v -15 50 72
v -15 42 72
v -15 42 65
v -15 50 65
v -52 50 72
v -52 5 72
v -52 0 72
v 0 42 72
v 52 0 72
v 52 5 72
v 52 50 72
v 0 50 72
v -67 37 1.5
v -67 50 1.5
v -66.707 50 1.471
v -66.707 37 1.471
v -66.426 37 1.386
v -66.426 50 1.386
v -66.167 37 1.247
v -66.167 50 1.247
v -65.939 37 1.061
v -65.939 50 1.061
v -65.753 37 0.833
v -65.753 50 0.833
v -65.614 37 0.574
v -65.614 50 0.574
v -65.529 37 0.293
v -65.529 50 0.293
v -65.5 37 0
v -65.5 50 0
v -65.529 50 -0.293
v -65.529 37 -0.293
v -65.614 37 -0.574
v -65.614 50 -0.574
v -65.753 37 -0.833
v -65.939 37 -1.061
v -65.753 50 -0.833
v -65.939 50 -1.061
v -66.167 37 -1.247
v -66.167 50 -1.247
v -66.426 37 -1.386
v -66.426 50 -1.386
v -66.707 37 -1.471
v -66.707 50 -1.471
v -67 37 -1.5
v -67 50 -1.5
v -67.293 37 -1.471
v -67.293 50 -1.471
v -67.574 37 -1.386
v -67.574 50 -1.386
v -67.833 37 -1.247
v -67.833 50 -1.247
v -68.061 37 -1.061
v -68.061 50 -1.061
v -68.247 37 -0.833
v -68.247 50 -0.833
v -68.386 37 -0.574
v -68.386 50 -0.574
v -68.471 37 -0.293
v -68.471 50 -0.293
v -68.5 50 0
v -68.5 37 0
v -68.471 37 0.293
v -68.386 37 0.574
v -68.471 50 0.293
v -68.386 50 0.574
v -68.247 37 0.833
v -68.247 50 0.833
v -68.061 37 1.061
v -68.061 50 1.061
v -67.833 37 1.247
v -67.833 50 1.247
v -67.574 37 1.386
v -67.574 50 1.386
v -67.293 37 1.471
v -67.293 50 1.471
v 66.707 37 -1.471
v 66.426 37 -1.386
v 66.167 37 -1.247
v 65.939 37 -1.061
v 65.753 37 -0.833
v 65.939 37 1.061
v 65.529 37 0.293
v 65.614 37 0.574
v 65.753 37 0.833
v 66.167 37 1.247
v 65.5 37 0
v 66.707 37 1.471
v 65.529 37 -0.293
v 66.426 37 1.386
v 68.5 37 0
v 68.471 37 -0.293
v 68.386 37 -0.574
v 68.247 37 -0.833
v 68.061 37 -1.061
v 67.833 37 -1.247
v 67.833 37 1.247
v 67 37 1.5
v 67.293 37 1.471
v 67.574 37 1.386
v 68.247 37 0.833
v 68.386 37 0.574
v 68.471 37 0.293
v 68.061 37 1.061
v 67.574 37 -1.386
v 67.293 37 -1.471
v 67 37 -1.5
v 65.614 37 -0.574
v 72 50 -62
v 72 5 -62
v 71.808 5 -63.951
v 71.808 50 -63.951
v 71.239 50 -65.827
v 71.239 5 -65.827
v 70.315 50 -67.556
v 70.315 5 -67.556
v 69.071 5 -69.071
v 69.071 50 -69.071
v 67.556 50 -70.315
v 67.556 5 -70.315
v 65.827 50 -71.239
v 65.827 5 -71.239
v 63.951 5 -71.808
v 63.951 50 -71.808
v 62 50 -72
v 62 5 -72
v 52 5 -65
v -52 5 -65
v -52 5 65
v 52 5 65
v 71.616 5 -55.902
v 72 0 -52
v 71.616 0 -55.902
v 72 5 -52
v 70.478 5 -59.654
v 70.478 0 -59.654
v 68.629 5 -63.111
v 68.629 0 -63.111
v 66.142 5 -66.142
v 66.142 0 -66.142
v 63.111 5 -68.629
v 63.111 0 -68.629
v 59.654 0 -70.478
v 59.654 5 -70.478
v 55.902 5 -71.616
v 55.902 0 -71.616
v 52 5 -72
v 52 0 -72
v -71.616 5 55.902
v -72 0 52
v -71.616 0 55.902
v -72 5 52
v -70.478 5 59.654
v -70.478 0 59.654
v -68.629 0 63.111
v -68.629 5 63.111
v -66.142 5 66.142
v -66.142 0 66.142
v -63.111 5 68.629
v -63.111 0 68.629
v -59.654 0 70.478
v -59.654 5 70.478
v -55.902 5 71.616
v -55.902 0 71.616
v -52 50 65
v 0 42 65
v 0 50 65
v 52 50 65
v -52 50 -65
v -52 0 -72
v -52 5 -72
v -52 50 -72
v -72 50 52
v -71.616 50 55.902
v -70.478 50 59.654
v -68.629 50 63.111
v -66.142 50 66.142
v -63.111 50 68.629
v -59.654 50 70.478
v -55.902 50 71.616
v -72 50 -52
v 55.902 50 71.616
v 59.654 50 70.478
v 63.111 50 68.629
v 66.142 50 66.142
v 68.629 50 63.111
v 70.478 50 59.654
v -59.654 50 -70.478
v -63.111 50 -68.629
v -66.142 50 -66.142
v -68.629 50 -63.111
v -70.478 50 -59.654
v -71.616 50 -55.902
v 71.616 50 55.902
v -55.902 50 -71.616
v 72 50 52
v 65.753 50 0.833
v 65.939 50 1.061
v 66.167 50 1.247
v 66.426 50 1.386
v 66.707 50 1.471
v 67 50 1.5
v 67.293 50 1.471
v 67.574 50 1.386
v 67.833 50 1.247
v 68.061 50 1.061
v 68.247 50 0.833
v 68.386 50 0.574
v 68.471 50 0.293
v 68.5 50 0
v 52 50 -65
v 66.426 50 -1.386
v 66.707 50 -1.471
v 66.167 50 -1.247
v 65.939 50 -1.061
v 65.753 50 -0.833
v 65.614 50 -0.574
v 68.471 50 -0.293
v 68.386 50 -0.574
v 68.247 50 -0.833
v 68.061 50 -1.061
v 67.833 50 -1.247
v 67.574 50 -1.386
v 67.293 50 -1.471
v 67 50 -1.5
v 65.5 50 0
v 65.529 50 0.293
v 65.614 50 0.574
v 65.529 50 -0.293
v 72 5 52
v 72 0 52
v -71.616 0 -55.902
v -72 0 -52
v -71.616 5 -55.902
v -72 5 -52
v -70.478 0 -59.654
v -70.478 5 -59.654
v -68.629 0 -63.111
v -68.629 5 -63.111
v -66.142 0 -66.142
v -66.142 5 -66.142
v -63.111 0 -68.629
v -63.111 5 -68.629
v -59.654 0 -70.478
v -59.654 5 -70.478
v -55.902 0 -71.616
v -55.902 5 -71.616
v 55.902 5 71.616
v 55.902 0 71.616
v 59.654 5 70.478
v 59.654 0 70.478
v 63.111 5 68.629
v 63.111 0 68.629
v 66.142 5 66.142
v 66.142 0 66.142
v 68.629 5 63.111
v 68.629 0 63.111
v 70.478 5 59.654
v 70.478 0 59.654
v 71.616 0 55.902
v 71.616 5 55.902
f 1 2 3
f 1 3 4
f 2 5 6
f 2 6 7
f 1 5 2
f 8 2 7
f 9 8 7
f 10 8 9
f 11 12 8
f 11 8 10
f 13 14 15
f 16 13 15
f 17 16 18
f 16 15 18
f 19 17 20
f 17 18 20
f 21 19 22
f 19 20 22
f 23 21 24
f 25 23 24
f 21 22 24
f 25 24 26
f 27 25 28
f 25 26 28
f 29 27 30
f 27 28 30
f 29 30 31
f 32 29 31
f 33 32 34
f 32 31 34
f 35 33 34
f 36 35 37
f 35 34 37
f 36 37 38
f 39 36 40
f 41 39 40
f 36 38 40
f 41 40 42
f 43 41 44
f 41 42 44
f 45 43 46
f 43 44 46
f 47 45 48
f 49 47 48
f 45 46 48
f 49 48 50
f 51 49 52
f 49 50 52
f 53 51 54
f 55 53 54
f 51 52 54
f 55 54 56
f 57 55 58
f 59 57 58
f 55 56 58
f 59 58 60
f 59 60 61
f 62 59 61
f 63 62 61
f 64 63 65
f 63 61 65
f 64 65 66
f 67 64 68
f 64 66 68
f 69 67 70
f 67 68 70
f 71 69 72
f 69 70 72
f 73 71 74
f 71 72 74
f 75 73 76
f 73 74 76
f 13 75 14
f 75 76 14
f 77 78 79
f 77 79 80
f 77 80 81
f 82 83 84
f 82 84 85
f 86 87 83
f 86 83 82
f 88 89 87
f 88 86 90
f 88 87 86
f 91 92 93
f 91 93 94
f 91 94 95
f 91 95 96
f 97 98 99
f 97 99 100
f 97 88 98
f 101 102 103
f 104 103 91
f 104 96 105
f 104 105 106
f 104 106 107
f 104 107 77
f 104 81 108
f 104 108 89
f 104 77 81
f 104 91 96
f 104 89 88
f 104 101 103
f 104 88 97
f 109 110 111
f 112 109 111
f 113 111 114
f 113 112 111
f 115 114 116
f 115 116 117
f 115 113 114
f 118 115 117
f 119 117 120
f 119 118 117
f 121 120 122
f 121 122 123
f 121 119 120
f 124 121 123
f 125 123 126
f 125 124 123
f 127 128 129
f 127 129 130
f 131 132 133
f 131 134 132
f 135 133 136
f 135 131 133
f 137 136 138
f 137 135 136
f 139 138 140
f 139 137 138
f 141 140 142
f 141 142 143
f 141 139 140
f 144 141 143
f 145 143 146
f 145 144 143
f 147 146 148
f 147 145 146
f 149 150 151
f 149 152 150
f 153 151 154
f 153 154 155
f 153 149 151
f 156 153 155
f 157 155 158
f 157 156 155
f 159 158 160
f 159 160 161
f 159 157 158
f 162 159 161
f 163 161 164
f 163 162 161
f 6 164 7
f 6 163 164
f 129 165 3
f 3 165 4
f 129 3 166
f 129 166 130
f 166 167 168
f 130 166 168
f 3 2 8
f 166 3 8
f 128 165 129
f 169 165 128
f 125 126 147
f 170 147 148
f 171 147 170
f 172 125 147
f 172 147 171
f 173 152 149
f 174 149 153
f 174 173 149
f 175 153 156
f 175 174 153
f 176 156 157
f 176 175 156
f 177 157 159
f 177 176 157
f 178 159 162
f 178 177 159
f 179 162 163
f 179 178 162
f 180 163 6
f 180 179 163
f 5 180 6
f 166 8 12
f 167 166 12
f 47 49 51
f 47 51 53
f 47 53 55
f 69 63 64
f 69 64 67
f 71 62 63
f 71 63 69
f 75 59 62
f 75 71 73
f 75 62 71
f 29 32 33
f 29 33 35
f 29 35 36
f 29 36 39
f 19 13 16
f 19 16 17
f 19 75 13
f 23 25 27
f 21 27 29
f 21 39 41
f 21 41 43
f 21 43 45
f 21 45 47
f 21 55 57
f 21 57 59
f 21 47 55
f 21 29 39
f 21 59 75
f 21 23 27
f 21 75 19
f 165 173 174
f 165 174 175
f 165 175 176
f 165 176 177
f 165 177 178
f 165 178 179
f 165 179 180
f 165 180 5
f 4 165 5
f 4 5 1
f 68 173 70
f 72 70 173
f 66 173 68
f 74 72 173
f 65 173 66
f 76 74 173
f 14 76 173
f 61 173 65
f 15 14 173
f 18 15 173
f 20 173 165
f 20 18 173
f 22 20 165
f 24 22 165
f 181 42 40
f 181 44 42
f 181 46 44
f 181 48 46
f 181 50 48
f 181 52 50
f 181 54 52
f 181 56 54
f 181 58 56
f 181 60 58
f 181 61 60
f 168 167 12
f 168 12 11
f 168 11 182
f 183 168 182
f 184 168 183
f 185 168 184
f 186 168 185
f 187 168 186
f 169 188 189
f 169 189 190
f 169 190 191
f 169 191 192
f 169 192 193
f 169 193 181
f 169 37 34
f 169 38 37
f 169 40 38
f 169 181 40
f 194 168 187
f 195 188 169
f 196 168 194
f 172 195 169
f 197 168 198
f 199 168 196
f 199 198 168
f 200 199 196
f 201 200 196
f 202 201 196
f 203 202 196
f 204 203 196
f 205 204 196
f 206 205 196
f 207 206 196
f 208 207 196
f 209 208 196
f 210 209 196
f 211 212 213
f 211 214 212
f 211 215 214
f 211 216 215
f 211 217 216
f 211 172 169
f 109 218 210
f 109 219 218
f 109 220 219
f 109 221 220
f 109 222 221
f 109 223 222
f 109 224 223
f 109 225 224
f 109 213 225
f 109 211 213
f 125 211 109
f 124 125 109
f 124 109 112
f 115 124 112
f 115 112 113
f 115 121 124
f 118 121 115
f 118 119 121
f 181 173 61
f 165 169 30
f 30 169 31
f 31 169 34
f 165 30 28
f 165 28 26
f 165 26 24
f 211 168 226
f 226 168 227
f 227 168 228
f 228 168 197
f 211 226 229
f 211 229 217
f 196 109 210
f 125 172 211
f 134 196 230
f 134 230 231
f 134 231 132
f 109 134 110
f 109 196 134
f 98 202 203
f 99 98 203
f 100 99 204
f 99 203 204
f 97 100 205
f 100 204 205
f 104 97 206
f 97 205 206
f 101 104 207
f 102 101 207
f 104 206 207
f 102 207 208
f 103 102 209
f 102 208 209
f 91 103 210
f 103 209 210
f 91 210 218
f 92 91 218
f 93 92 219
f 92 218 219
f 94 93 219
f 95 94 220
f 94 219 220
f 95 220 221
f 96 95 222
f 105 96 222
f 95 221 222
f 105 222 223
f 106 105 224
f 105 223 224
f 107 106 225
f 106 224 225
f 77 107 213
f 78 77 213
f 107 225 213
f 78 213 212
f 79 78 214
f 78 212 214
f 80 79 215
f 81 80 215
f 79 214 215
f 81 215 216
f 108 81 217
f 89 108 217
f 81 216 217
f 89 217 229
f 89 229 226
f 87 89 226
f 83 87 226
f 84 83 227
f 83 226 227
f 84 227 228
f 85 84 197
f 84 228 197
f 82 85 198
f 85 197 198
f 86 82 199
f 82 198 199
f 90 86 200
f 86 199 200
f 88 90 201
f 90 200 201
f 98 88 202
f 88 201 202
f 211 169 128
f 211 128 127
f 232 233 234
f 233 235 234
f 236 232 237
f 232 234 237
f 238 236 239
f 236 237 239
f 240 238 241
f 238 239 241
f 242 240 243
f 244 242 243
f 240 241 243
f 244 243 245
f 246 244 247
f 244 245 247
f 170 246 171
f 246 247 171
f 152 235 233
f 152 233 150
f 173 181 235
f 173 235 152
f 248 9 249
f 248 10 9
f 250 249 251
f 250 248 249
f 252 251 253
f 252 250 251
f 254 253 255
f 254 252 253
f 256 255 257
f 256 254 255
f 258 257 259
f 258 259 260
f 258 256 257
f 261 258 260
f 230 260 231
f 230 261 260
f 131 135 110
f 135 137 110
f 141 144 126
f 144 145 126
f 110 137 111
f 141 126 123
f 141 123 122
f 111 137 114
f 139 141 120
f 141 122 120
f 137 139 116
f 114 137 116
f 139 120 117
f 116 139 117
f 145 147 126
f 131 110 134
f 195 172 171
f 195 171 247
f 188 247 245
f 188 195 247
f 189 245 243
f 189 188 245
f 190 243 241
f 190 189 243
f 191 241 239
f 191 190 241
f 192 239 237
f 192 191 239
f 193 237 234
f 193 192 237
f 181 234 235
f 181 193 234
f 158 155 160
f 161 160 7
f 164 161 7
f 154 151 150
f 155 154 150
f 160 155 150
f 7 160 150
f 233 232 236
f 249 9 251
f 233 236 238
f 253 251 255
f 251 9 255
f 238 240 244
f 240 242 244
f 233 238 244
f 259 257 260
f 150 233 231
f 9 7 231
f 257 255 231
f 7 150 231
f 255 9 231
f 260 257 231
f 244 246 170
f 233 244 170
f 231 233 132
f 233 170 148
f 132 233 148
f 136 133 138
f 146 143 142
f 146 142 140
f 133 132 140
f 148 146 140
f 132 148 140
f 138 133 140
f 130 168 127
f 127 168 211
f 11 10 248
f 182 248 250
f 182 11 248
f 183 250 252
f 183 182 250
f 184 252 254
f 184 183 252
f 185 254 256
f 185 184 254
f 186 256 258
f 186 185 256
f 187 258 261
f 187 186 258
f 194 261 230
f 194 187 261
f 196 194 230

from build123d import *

# Parameters (mm, degrees)
SKETCH1_W           = 144
SKETCH1_H           = 144
BOSS_EXTRUDE1_DEPTH = 5
FILLET1_R           = 20
BOSS_EXTRUDE2_START = 45
SKETCH2_W           = 104
SKETCH2_H           = 130
BOSS_EXTRUDE2_DEPTH = 45
SKETCH3_R           = 1.5
CUT_EXTRUDE1_DEPTH  = 13
SKETCH5_W           = 15
SKETCH5_H           = 8
CUT_EXTRUDE2_DEPTH  = 8


with BuildPart() as part:
    # Sketch1 → Boss-Extrude1 (new body)
    with BuildSketch(Plane(origin=(0, 0, 0), x_dir=(1, 0, 0), z_dir=(0, 1, 0))):
        Rectangle(SKETCH1_W, SKETCH1_H)
    extrude(amount=BOSS_EXTRUDE1_DEPTH)

    # Fillet1
    fillet1_edges = [part.edges().sort_by_distance(p)[0] for p in [
        (72, 2.5, 72),
        (-72, 2.5, 72),
        (-72, 2.5, -72),
        (72, 2.5, -72),
    ]]
    fillet(fillet1_edges, radius=FILLET1_R)

    # Sketch2 → Boss-Extrude2 (add)
    with BuildSketch(Plane(origin=(0, 5, 0), x_dir=(1, 0, 0), z_dir=(0, 1, 0)).offset(BOSS_EXTRUDE2_START)):
        with BuildLine():
            Line((-72, 52), (-72, -52))
            ThreePointArc((-72, -52), (-66.142135624, -66.142135624), (-52, -72))
            Line((-52, -72), (52, -72))
            ThreePointArc((52, -72), (66.142135624, -66.142135624), (72, -52))
            Line((72, -52), (72, 62))
            ThreePointArc((72, 62), (69.071067812, 69.071067812), (62, 72))
            Line((62, 72), (-52, 72))
            ThreePointArc((-52, 72), (-66.142135624, 66.142135624), (-72, 52))
        make_face()
        Rectangle(SKETCH2_W, SKETCH2_H, mode=Mode.SUBTRACT)
    extrude(amount=-BOSS_EXTRUDE2_DEPTH)

    # Sketch3 → Cut-Extrude1 (cut)
    with BuildSketch(Plane(origin=(0, 50, 0), x_dir=(1, 0, 0), z_dir=(0, 1, 0))):
        with Locations(Location((-67, 0, 0), (0, 0, 270))):
            Circle(SKETCH3_R)
        with Locations(Location((67, 0, 0), (0, 0, 270))):
            Circle(SKETCH3_R)
    extrude(amount=-CUT_EXTRUDE1_DEPTH, mode=Mode.SUBTRACT)

    # Sketch5 → Cut-Extrude2 (cut)
    with BuildSketch(Plane.XY.offset(72)):
        with Locations((-7.5, 46)):
            Rectangle(SKETCH5_W, SKETCH5_H)
    extrude(amount=-CUT_EXTRUDE2_DEPTH, mode=Mode.SUBTRACT)


solid = part.part
